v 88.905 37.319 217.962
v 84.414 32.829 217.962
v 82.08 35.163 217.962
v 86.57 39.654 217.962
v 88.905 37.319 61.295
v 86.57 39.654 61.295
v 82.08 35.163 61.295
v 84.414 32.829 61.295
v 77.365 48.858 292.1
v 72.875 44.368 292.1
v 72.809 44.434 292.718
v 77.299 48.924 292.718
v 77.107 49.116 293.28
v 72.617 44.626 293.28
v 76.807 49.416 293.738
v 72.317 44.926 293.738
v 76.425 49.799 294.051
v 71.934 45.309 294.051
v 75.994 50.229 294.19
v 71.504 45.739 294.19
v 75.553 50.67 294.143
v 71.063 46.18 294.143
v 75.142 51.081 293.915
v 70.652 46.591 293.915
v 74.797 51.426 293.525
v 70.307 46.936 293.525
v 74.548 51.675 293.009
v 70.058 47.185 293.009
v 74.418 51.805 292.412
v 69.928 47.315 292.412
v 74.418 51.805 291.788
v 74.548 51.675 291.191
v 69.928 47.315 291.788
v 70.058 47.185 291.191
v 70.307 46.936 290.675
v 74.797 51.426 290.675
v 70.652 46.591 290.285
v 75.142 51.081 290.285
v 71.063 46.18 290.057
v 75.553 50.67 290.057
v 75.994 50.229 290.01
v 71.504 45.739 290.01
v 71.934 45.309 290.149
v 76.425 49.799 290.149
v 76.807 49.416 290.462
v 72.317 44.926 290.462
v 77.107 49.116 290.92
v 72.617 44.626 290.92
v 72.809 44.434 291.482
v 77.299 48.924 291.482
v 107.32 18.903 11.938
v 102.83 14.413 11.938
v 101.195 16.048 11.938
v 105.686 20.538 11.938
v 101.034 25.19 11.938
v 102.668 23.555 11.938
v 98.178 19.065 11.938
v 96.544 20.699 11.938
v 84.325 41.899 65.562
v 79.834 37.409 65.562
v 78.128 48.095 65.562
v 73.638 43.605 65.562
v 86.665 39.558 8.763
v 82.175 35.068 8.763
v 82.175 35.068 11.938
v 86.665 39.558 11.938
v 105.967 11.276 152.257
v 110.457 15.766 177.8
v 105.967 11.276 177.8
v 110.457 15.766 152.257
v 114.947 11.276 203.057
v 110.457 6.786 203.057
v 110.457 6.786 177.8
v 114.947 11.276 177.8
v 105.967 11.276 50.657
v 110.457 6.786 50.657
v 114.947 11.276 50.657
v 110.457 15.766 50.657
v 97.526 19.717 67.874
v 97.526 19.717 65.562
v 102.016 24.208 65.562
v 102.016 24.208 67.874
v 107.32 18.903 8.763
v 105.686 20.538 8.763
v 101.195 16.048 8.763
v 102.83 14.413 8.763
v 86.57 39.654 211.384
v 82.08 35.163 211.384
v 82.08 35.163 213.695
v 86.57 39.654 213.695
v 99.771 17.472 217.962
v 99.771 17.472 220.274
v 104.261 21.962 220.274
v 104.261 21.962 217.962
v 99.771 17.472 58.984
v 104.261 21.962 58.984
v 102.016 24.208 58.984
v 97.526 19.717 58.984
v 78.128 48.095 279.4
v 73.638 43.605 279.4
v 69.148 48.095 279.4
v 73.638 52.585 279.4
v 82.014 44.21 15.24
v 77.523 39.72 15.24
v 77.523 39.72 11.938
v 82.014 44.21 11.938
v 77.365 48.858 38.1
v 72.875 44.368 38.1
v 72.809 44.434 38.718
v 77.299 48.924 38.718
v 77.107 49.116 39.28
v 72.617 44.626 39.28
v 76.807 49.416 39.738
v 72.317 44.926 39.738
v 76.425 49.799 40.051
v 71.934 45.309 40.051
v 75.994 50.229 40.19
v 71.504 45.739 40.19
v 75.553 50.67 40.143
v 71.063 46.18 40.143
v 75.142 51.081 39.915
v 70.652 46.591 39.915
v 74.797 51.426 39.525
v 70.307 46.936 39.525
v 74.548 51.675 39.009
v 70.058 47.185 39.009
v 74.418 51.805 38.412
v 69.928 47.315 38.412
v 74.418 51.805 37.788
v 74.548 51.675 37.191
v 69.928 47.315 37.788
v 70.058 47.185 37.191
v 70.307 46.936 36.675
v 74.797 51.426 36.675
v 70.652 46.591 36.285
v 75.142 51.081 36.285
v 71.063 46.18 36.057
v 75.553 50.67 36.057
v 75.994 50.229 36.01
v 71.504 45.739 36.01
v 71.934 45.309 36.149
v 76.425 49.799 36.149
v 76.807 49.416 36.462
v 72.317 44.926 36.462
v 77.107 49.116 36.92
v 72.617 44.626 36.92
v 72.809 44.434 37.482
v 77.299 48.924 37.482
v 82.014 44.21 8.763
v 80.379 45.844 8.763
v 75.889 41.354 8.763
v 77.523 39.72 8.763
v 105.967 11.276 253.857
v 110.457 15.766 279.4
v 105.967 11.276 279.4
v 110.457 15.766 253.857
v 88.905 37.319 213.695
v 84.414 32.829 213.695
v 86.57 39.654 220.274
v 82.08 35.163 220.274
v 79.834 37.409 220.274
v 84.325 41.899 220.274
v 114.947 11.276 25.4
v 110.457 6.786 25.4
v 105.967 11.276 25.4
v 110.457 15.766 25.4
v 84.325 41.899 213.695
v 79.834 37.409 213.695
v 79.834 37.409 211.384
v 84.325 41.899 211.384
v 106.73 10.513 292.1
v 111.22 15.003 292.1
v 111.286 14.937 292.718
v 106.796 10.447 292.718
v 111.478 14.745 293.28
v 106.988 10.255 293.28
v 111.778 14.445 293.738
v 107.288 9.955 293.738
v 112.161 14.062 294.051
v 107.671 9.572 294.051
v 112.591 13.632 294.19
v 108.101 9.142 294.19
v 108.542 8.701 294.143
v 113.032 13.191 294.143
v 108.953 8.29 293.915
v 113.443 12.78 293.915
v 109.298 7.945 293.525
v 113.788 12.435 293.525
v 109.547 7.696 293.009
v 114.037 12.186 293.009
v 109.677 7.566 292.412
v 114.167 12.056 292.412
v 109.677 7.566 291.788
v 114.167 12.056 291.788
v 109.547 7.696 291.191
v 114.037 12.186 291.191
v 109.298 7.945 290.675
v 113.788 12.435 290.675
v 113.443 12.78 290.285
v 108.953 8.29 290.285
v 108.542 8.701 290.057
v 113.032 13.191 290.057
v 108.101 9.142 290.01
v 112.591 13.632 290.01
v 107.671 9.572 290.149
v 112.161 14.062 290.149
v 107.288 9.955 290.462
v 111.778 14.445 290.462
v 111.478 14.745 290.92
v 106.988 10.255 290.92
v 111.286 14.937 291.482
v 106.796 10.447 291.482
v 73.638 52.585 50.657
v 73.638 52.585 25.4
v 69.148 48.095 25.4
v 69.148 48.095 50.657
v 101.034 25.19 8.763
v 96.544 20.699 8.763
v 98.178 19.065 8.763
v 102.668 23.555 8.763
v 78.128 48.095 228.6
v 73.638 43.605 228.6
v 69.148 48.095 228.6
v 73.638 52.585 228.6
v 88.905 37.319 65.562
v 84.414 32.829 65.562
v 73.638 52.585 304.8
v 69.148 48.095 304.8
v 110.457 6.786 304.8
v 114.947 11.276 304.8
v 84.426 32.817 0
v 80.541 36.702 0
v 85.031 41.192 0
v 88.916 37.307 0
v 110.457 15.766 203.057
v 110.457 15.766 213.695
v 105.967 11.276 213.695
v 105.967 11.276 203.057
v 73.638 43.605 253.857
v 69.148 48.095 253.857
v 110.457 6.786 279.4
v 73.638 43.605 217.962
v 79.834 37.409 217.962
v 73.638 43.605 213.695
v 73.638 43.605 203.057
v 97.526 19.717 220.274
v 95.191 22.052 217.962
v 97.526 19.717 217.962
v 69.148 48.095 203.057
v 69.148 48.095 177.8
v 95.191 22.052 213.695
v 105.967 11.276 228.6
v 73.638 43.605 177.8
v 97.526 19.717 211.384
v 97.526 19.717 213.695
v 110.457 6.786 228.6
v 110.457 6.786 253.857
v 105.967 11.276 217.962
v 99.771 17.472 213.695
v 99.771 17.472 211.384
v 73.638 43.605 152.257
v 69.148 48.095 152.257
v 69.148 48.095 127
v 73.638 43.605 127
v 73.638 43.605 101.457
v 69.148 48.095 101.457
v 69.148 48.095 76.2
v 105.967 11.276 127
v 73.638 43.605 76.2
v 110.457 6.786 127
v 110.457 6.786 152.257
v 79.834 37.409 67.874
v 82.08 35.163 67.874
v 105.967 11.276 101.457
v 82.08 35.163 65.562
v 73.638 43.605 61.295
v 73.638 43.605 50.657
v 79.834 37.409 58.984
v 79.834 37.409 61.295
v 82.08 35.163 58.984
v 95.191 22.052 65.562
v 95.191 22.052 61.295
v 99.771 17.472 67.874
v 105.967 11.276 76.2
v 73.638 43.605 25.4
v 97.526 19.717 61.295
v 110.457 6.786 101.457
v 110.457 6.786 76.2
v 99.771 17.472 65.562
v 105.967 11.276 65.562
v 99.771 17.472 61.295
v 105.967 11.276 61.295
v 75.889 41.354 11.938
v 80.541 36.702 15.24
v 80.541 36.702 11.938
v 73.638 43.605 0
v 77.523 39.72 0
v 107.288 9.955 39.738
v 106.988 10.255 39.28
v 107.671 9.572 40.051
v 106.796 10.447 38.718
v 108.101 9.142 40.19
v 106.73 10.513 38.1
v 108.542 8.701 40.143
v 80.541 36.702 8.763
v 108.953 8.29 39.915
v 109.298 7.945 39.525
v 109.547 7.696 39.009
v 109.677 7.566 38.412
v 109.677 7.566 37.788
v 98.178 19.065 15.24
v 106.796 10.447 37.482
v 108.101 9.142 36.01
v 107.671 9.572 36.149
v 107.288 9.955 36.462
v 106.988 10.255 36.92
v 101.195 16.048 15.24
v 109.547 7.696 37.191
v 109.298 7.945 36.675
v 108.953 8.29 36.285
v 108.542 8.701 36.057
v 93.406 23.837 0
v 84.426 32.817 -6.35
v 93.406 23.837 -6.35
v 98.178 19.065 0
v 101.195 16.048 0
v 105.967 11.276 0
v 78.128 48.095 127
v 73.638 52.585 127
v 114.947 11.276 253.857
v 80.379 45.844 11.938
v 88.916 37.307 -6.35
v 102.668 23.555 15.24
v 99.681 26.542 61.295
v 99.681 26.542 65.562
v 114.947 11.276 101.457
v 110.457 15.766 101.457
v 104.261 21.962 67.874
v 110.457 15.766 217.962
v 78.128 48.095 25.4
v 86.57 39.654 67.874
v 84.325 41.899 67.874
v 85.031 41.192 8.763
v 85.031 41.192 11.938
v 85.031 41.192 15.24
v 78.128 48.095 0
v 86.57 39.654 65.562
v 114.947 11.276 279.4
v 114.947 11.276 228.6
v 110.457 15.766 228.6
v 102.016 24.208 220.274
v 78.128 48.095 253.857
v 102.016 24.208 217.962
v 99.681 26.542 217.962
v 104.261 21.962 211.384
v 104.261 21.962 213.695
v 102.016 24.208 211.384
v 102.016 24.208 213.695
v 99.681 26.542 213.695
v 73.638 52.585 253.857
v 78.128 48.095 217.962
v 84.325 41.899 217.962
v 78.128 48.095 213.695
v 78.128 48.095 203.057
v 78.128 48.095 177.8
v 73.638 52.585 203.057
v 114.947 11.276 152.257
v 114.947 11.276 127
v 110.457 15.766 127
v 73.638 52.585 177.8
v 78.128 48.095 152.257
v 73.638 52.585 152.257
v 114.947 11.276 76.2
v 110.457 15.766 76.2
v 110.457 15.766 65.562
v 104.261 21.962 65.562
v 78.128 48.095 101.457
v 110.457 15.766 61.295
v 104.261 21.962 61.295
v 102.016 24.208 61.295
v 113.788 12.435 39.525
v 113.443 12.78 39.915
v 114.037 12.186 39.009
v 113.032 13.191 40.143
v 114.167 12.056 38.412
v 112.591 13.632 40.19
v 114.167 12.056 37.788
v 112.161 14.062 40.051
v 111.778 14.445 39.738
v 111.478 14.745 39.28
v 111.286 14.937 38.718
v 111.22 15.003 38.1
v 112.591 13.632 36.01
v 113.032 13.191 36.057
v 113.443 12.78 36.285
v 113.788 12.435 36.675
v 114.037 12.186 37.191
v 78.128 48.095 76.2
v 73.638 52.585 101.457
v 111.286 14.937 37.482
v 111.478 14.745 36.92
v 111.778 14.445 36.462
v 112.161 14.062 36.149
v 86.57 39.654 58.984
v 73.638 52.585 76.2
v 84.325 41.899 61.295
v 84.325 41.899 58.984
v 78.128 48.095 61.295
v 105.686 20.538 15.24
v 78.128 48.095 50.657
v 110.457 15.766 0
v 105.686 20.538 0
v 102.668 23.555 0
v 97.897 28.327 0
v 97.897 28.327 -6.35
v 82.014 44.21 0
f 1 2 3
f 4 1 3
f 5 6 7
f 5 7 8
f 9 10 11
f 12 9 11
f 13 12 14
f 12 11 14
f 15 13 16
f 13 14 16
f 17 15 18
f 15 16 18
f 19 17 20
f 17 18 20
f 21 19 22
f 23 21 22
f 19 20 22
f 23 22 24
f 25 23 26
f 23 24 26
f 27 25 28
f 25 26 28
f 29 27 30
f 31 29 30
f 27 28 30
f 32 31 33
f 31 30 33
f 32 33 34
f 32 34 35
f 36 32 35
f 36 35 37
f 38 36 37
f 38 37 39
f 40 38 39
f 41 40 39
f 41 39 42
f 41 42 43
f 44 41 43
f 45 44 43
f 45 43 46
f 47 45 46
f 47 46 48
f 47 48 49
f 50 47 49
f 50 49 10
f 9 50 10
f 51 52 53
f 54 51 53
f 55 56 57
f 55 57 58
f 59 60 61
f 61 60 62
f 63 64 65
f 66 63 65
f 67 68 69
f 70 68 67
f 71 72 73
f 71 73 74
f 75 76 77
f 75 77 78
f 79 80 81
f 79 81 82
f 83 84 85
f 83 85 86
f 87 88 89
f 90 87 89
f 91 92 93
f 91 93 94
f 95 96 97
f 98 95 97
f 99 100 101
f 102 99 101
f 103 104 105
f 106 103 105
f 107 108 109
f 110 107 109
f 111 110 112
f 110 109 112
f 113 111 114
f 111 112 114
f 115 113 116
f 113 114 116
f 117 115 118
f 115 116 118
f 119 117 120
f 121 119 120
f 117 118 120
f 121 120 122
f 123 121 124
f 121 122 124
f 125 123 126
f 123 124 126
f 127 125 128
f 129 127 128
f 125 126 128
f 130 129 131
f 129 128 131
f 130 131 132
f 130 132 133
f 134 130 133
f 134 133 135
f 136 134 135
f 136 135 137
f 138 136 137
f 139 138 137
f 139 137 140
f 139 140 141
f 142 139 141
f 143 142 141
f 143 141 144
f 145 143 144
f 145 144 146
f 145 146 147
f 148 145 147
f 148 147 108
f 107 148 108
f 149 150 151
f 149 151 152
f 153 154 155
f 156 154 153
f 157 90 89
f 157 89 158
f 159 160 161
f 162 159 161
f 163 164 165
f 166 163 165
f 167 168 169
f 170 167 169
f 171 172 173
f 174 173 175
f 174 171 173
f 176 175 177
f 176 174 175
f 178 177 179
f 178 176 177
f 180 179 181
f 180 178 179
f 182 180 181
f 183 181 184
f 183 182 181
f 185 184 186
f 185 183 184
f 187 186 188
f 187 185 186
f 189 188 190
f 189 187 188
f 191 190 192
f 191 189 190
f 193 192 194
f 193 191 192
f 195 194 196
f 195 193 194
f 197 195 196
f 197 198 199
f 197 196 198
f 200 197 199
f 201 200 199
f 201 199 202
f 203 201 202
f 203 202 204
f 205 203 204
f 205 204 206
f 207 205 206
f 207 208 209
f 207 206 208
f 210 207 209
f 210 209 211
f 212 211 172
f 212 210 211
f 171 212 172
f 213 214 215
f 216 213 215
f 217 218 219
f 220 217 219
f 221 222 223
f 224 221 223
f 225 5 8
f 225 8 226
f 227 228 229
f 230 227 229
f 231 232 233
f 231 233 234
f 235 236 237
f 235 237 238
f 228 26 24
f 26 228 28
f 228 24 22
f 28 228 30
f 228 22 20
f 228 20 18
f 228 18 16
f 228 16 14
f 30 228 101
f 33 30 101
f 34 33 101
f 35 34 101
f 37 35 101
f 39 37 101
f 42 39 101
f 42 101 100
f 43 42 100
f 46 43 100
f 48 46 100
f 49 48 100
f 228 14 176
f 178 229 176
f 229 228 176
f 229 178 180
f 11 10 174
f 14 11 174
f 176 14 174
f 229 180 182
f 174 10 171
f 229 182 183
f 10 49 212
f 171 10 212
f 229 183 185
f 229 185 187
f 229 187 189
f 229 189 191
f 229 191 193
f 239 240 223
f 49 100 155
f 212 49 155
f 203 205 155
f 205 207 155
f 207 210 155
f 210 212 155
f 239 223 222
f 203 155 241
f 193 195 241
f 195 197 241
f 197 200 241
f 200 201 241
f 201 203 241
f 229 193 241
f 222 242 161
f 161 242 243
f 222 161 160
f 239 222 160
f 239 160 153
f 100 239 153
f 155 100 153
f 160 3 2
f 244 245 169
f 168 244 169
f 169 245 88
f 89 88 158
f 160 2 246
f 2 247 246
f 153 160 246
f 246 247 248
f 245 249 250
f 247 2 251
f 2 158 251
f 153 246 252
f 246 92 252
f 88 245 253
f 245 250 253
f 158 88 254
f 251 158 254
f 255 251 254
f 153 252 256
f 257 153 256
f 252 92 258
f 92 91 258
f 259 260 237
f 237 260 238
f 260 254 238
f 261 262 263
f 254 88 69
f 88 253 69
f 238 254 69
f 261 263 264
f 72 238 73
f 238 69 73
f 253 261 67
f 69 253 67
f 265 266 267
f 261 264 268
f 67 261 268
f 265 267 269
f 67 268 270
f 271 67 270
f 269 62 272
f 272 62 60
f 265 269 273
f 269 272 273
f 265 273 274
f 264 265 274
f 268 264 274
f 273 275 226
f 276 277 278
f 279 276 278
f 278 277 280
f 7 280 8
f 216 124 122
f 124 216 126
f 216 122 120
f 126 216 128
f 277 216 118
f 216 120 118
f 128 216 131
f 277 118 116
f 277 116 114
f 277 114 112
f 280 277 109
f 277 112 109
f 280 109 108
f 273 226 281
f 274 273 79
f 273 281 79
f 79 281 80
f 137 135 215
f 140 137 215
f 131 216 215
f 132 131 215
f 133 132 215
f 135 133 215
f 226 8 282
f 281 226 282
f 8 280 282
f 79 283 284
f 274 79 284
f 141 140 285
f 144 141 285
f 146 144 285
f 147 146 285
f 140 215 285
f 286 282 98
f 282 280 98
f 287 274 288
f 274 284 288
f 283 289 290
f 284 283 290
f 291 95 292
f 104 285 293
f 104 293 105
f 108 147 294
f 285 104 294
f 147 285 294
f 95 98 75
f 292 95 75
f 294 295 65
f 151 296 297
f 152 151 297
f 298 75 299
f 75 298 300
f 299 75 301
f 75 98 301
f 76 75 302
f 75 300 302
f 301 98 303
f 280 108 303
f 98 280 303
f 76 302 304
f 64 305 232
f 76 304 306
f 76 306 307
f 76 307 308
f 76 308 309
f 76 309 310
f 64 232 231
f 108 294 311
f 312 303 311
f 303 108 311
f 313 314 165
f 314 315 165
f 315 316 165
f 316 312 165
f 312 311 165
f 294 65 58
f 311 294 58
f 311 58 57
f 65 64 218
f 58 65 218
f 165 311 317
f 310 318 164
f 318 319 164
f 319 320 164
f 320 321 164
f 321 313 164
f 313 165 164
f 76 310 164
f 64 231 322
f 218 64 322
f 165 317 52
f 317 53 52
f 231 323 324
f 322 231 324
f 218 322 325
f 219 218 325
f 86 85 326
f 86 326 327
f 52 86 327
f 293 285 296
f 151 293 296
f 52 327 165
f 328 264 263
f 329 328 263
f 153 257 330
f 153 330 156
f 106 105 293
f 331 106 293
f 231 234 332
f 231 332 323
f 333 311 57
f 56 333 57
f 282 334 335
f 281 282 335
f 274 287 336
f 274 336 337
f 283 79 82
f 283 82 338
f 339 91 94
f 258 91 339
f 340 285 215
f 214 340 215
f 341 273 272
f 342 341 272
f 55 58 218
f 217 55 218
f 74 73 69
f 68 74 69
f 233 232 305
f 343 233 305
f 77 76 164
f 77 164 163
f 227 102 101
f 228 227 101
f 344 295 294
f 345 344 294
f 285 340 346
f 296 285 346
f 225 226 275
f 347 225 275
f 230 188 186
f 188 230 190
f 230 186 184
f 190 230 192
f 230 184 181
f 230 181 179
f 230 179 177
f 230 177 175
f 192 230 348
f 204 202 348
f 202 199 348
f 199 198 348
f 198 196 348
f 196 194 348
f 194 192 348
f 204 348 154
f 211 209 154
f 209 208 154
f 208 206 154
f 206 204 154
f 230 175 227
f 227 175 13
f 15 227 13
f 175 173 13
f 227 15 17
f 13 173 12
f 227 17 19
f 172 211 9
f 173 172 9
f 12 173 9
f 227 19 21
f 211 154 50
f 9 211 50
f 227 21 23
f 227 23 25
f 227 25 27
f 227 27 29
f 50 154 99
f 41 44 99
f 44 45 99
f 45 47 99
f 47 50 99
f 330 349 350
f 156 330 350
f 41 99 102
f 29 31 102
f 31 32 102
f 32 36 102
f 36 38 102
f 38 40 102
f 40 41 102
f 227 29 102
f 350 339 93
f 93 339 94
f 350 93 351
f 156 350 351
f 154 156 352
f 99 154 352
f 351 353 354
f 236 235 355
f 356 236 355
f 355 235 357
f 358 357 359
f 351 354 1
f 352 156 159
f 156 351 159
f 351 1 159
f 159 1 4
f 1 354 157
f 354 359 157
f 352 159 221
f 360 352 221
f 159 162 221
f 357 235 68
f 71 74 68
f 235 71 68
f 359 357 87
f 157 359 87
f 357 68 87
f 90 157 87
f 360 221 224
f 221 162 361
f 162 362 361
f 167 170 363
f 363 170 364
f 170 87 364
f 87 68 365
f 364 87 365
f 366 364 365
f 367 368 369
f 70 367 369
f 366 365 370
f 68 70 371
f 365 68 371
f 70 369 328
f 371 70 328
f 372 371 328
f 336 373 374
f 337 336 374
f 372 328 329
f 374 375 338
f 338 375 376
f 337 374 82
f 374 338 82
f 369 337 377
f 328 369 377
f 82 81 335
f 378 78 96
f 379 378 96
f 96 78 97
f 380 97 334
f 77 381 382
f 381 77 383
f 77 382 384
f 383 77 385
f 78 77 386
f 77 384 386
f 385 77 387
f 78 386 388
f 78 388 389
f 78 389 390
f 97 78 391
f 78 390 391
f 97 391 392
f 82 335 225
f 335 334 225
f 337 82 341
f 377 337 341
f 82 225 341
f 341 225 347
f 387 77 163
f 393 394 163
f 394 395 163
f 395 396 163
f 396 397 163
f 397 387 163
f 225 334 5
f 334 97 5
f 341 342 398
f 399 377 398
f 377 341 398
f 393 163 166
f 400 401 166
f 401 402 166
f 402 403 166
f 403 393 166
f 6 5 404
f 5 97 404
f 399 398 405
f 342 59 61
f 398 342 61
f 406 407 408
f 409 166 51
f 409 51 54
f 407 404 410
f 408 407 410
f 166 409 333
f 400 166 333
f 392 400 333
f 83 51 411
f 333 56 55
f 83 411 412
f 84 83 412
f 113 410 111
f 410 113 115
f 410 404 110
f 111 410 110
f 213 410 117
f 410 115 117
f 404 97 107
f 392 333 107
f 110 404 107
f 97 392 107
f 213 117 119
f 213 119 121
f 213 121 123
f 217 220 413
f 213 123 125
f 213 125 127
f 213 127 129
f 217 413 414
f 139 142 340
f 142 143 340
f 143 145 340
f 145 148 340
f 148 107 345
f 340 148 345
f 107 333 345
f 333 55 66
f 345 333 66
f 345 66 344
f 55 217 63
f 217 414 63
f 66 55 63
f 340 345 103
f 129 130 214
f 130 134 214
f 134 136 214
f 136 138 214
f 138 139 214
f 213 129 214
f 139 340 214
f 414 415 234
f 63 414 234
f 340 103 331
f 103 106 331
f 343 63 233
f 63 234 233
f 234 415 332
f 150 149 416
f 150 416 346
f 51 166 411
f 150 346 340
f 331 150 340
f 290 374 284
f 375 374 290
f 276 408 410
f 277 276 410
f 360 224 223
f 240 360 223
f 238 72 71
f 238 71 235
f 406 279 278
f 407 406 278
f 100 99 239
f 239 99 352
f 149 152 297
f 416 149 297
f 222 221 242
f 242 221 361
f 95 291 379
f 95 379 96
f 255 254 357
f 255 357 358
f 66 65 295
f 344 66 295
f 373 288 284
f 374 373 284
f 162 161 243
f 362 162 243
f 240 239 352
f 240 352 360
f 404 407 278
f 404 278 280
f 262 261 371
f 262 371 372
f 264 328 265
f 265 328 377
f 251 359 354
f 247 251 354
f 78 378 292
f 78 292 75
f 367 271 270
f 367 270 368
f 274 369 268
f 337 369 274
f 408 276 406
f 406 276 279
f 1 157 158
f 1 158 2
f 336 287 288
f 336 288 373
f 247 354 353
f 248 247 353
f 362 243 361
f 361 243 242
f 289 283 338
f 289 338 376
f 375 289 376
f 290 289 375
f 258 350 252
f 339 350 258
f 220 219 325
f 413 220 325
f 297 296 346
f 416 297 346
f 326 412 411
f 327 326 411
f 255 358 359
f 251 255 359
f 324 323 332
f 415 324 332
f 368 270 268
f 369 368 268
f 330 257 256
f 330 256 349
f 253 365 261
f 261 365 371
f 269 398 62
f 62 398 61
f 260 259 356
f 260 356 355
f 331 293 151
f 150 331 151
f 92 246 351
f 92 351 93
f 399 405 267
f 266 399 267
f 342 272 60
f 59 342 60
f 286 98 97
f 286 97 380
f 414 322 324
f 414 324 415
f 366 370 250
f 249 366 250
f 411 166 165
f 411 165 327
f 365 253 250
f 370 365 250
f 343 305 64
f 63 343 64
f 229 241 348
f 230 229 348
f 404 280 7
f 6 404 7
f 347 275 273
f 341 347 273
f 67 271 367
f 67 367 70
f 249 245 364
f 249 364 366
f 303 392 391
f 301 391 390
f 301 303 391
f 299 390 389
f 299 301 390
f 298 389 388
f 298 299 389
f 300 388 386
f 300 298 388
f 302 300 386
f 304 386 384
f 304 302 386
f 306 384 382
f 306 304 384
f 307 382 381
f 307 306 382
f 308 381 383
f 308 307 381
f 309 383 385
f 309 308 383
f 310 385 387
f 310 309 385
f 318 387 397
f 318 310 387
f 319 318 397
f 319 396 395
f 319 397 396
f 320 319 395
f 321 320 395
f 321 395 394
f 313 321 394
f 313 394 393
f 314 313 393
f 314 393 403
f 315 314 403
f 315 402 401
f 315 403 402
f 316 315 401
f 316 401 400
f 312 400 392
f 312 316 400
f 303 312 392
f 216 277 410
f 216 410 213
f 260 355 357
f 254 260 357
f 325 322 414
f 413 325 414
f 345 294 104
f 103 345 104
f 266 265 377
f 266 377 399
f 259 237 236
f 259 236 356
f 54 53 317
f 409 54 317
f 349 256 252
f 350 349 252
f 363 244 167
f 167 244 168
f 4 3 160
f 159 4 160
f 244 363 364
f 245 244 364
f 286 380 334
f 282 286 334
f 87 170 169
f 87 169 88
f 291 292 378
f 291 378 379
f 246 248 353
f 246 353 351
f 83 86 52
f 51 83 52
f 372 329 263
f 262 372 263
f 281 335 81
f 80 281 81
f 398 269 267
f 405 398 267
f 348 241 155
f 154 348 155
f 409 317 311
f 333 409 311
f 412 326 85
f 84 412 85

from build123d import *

# Parameters (mm, degrees)
BOSS_EXTRUDE1_DEPTH = 304.8
SKETCH2_W           = 25.542619615
SKETCH2_H           = 6.35
CUT_EXTRUDE1_DEPTH  = 6.35
LPATTERN1_COUNT     = 6
LPATTERN1_PITCH     = 50.8
BOSS_EXTRUDE2_DEPTH = 6.35
CUT_EXTRUDE2_DEPTH  = 315.265122799
SKETCH5_R           = 2.0955
CUT_EXTRUDE3_DEPTH  = 315.265122799
CUT_EXTRUDE4_DEPTH  = 315.265122799


with BuildPart() as part:
    # Sketch1 → Boss-Extrude1 (new body)
    with BuildSketch(Plane.XY):
        Polygon((69.147972132, 48.095032857), (110.457150289, 6.7858547), (114.94727835, 11.275982761), (73.638100193, 52.585160918), align=None)
    extrude(amount=BOSS_EXTRUDE1_DEPTH)

    # Sketch2 → Cut-Extrude1 (cut)
    with BuildSketch(Plane(origin=(63.111630555, 63.111630555, 0), x_dir=(0, 0, -1), z_dir=(0.7071067811865472, 0.7071067811865478, 0))):
        with Locations((-266.628690193, -18.061676125)):
            Rectangle(SKETCH2_W, SKETCH2_H)
        with Locations((-266.628690193, -70.131676125)):
            Rectangle(SKETCH2_W, SKETCH2_H)
    cut_extrude1 = extrude(amount=-CUT_EXTRUDE1_DEPTH, mode=Mode.SUBTRACT)

    # LPattern1: Cut-Extrude1 ×6
    with Locations(*[(0, 0, -i * LPATTERN1_PITCH) for i in range(1, LPATTERN1_COUNT)]):
        add(cut_extrude1, mode=Mode.SUBTRACT)

    # Sketch3 → Boss-Extrude2 (add)
    with BuildSketch(Plane(origin=(0, 0, 0), x_dir=(-1, 0, 0), z_dir=(0, 0, -1))):
        Polygon((-84.426151589, 32.816853401), (-93.40640771, 23.83659728), (-97.89653577, 28.32672534), (-88.916279649, 37.306981461), align=None)
    extrude(amount=BOSS_EXTRUDE2_DEPTH)

    # Sketch4 → Cut-Extrude2 (cut, through all)
    with BuildSketch(Plane(origin=(58.621502495, 58.621502495, 0), x_dir=(-0.7071067811865478, 0.7071067811865472, 0), z_dir=(-0.7071067811865472, -0.7071067811865478, 0))):
        Polygon((-55.941380423, 0), (-60.208580423, 0), (-60.208580423, -8.763), (-62.519980423, -8.763), (-62.519980423, -11.938), (-60.208580423, -11.938), (-60.208580423, -15.24), (-55.941380423, -15.24), (-55.941380423, -11.938), (-53.629980423, -11.938), (-53.629980423, -8.763), (-55.941380423, -8.763), align=None)
        Polygon((-26.731380423, 0), (-30.998580423, 0), (-30.998580423, -8.763), (-33.309980423, -8.763), (-33.309980423, -11.938), (-30.998580423, -11.938), (-30.998580423, -15.24), (-26.731380423, -15.24), (-26.731380423, -11.938), (-24.419980423, -11.938), (-24.419980423, -8.763), (-26.731380423, -8.763), align=None)
    extrude(amount=-CUT_EXTRUDE2_DEPTH, mode=Mode.SUBTRACT)

    # Sketch5 → Cut-Extrude3 (cut, through all)
    with BuildSketch(Plane(origin=(58.621502495, 58.621502495, 0), x_dir=(-0.7071067811865478, 0.7071067811865472, 0), z_dir=(-0.7071067811865472, -0.7071067811865478, 0))):
        with Locations(Location((-18.061676125, -38.1, 0), (0, 0, 180))):
            Circle(SKETCH5_R)
        with Locations(Location((-18.061676125, -292.1, 0), (0, 0, 180))):
            Circle(SKETCH5_R)
    cut_extrude3 = extrude(amount=-CUT_EXTRUDE3_DEPTH, mode=Mode.SUBTRACT)

    # Mirror1: Cut-Extrude3 across plane
    add(cut_extrude3.mirror(Plane(origin=(31.181058716, -31.181058716, 0), x_dir=(0, 0, 1), z_dir=(0.7071067811865478, -0.7071067811865472, 0))), mode=Mode.SUBTRACT)

    # Sketch6 → Cut-Extrude4 (cut, through all)
    with BuildSketch(Plane(origin=(58.621502495, 58.621502495, 0), x_dir=(-0.7071067811865478, 0.7071067811865472, 0), z_dir=(-0.7071067811865472, -0.7071067811865478, 0))):
        Polygon((-21.236676125, -65.562290193), (-21.236676125, -61.295090193), (-29.999676125, -61.295090193), (-29.999676125, -58.983690193), (-33.174676125, -58.983690193), (-33.174676125, -61.295090193), (-36.476676125, -61.295090193), (-36.476676125, -65.562290193), (-33.174676125, -65.562290193), (-33.174676125, -67.873690193), (-29.999676125, -67.873690193), (-29.999676125, -65.562290193), align=None)
        Polygon((-21.236676125, -217.962290193), (-21.236676125, -213.695090193), (-29.999676125, -213.695090193), (-29.999676125, -211.383690193), (-33.174676125, -211.383690193), (-33.174676125, -213.695090193), (-36.476676125, -213.695090193), (-36.476676125, -217.962290193), (-33.174676125, -217.962290193), (-33.174676125, -220.273690193), (-29.999676125, -220.273690193), (-29.999676125, -217.962290193), align=None)
    cut_extrude4 = extrude(amount=-CUT_EXTRUDE4_DEPTH, mode=Mode.SUBTRACT)

    # Mirror2: Cut-Extrude4 across plane
    add(cut_extrude4.mirror(Plane(origin=(31.181058716, -31.181058716, 0), x_dir=(0, 0, 1), z_dir=(0.7071067811865478, -0.7071067811865472, 0))), mode=Mode.SUBTRACT)


solid = part.part
